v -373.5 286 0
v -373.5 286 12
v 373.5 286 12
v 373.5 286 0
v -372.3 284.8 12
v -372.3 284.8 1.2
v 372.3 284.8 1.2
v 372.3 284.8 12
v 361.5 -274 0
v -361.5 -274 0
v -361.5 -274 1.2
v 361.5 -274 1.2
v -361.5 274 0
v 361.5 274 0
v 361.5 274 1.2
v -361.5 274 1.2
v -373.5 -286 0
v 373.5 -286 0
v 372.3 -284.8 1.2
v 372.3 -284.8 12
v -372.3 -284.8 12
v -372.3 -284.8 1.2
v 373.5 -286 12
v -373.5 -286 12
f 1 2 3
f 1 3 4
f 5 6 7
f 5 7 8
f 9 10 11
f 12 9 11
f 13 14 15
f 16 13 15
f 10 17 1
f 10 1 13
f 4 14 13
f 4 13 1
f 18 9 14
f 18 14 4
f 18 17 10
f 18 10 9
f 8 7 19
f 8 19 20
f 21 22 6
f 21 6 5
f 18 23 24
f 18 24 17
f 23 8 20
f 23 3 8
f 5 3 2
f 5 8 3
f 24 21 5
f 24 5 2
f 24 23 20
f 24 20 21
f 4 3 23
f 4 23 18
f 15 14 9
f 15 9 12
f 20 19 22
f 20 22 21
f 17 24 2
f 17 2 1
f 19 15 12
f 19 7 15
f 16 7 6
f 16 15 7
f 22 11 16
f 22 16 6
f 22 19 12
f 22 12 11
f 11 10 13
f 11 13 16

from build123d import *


with BuildPart() as f2:
    # F2: sweep along a path in F0
    with BuildLine(Plane.XY) as f2_path:
        Line((-373.5, 286), (-373.5, -286))
        Line((-373.5, -286), (373.5, -286))
        Line((373.5, -286), (373.5, 286))
        Line((373.5, 286), (-373.5, 286))
    # F1 (on Front) → F2 (sweep)
    with BuildSketch(Plane.XZ):
        Polygon((-372.3, 12), (-373.5, 12), (-373.5, 0), (-361.5, 0), (-361.5, 1.2), (-372.3, 1.2), align=None)
    sweep(path=f2_path.line, transition=Transition.RIGHT)


solid = f2.part
